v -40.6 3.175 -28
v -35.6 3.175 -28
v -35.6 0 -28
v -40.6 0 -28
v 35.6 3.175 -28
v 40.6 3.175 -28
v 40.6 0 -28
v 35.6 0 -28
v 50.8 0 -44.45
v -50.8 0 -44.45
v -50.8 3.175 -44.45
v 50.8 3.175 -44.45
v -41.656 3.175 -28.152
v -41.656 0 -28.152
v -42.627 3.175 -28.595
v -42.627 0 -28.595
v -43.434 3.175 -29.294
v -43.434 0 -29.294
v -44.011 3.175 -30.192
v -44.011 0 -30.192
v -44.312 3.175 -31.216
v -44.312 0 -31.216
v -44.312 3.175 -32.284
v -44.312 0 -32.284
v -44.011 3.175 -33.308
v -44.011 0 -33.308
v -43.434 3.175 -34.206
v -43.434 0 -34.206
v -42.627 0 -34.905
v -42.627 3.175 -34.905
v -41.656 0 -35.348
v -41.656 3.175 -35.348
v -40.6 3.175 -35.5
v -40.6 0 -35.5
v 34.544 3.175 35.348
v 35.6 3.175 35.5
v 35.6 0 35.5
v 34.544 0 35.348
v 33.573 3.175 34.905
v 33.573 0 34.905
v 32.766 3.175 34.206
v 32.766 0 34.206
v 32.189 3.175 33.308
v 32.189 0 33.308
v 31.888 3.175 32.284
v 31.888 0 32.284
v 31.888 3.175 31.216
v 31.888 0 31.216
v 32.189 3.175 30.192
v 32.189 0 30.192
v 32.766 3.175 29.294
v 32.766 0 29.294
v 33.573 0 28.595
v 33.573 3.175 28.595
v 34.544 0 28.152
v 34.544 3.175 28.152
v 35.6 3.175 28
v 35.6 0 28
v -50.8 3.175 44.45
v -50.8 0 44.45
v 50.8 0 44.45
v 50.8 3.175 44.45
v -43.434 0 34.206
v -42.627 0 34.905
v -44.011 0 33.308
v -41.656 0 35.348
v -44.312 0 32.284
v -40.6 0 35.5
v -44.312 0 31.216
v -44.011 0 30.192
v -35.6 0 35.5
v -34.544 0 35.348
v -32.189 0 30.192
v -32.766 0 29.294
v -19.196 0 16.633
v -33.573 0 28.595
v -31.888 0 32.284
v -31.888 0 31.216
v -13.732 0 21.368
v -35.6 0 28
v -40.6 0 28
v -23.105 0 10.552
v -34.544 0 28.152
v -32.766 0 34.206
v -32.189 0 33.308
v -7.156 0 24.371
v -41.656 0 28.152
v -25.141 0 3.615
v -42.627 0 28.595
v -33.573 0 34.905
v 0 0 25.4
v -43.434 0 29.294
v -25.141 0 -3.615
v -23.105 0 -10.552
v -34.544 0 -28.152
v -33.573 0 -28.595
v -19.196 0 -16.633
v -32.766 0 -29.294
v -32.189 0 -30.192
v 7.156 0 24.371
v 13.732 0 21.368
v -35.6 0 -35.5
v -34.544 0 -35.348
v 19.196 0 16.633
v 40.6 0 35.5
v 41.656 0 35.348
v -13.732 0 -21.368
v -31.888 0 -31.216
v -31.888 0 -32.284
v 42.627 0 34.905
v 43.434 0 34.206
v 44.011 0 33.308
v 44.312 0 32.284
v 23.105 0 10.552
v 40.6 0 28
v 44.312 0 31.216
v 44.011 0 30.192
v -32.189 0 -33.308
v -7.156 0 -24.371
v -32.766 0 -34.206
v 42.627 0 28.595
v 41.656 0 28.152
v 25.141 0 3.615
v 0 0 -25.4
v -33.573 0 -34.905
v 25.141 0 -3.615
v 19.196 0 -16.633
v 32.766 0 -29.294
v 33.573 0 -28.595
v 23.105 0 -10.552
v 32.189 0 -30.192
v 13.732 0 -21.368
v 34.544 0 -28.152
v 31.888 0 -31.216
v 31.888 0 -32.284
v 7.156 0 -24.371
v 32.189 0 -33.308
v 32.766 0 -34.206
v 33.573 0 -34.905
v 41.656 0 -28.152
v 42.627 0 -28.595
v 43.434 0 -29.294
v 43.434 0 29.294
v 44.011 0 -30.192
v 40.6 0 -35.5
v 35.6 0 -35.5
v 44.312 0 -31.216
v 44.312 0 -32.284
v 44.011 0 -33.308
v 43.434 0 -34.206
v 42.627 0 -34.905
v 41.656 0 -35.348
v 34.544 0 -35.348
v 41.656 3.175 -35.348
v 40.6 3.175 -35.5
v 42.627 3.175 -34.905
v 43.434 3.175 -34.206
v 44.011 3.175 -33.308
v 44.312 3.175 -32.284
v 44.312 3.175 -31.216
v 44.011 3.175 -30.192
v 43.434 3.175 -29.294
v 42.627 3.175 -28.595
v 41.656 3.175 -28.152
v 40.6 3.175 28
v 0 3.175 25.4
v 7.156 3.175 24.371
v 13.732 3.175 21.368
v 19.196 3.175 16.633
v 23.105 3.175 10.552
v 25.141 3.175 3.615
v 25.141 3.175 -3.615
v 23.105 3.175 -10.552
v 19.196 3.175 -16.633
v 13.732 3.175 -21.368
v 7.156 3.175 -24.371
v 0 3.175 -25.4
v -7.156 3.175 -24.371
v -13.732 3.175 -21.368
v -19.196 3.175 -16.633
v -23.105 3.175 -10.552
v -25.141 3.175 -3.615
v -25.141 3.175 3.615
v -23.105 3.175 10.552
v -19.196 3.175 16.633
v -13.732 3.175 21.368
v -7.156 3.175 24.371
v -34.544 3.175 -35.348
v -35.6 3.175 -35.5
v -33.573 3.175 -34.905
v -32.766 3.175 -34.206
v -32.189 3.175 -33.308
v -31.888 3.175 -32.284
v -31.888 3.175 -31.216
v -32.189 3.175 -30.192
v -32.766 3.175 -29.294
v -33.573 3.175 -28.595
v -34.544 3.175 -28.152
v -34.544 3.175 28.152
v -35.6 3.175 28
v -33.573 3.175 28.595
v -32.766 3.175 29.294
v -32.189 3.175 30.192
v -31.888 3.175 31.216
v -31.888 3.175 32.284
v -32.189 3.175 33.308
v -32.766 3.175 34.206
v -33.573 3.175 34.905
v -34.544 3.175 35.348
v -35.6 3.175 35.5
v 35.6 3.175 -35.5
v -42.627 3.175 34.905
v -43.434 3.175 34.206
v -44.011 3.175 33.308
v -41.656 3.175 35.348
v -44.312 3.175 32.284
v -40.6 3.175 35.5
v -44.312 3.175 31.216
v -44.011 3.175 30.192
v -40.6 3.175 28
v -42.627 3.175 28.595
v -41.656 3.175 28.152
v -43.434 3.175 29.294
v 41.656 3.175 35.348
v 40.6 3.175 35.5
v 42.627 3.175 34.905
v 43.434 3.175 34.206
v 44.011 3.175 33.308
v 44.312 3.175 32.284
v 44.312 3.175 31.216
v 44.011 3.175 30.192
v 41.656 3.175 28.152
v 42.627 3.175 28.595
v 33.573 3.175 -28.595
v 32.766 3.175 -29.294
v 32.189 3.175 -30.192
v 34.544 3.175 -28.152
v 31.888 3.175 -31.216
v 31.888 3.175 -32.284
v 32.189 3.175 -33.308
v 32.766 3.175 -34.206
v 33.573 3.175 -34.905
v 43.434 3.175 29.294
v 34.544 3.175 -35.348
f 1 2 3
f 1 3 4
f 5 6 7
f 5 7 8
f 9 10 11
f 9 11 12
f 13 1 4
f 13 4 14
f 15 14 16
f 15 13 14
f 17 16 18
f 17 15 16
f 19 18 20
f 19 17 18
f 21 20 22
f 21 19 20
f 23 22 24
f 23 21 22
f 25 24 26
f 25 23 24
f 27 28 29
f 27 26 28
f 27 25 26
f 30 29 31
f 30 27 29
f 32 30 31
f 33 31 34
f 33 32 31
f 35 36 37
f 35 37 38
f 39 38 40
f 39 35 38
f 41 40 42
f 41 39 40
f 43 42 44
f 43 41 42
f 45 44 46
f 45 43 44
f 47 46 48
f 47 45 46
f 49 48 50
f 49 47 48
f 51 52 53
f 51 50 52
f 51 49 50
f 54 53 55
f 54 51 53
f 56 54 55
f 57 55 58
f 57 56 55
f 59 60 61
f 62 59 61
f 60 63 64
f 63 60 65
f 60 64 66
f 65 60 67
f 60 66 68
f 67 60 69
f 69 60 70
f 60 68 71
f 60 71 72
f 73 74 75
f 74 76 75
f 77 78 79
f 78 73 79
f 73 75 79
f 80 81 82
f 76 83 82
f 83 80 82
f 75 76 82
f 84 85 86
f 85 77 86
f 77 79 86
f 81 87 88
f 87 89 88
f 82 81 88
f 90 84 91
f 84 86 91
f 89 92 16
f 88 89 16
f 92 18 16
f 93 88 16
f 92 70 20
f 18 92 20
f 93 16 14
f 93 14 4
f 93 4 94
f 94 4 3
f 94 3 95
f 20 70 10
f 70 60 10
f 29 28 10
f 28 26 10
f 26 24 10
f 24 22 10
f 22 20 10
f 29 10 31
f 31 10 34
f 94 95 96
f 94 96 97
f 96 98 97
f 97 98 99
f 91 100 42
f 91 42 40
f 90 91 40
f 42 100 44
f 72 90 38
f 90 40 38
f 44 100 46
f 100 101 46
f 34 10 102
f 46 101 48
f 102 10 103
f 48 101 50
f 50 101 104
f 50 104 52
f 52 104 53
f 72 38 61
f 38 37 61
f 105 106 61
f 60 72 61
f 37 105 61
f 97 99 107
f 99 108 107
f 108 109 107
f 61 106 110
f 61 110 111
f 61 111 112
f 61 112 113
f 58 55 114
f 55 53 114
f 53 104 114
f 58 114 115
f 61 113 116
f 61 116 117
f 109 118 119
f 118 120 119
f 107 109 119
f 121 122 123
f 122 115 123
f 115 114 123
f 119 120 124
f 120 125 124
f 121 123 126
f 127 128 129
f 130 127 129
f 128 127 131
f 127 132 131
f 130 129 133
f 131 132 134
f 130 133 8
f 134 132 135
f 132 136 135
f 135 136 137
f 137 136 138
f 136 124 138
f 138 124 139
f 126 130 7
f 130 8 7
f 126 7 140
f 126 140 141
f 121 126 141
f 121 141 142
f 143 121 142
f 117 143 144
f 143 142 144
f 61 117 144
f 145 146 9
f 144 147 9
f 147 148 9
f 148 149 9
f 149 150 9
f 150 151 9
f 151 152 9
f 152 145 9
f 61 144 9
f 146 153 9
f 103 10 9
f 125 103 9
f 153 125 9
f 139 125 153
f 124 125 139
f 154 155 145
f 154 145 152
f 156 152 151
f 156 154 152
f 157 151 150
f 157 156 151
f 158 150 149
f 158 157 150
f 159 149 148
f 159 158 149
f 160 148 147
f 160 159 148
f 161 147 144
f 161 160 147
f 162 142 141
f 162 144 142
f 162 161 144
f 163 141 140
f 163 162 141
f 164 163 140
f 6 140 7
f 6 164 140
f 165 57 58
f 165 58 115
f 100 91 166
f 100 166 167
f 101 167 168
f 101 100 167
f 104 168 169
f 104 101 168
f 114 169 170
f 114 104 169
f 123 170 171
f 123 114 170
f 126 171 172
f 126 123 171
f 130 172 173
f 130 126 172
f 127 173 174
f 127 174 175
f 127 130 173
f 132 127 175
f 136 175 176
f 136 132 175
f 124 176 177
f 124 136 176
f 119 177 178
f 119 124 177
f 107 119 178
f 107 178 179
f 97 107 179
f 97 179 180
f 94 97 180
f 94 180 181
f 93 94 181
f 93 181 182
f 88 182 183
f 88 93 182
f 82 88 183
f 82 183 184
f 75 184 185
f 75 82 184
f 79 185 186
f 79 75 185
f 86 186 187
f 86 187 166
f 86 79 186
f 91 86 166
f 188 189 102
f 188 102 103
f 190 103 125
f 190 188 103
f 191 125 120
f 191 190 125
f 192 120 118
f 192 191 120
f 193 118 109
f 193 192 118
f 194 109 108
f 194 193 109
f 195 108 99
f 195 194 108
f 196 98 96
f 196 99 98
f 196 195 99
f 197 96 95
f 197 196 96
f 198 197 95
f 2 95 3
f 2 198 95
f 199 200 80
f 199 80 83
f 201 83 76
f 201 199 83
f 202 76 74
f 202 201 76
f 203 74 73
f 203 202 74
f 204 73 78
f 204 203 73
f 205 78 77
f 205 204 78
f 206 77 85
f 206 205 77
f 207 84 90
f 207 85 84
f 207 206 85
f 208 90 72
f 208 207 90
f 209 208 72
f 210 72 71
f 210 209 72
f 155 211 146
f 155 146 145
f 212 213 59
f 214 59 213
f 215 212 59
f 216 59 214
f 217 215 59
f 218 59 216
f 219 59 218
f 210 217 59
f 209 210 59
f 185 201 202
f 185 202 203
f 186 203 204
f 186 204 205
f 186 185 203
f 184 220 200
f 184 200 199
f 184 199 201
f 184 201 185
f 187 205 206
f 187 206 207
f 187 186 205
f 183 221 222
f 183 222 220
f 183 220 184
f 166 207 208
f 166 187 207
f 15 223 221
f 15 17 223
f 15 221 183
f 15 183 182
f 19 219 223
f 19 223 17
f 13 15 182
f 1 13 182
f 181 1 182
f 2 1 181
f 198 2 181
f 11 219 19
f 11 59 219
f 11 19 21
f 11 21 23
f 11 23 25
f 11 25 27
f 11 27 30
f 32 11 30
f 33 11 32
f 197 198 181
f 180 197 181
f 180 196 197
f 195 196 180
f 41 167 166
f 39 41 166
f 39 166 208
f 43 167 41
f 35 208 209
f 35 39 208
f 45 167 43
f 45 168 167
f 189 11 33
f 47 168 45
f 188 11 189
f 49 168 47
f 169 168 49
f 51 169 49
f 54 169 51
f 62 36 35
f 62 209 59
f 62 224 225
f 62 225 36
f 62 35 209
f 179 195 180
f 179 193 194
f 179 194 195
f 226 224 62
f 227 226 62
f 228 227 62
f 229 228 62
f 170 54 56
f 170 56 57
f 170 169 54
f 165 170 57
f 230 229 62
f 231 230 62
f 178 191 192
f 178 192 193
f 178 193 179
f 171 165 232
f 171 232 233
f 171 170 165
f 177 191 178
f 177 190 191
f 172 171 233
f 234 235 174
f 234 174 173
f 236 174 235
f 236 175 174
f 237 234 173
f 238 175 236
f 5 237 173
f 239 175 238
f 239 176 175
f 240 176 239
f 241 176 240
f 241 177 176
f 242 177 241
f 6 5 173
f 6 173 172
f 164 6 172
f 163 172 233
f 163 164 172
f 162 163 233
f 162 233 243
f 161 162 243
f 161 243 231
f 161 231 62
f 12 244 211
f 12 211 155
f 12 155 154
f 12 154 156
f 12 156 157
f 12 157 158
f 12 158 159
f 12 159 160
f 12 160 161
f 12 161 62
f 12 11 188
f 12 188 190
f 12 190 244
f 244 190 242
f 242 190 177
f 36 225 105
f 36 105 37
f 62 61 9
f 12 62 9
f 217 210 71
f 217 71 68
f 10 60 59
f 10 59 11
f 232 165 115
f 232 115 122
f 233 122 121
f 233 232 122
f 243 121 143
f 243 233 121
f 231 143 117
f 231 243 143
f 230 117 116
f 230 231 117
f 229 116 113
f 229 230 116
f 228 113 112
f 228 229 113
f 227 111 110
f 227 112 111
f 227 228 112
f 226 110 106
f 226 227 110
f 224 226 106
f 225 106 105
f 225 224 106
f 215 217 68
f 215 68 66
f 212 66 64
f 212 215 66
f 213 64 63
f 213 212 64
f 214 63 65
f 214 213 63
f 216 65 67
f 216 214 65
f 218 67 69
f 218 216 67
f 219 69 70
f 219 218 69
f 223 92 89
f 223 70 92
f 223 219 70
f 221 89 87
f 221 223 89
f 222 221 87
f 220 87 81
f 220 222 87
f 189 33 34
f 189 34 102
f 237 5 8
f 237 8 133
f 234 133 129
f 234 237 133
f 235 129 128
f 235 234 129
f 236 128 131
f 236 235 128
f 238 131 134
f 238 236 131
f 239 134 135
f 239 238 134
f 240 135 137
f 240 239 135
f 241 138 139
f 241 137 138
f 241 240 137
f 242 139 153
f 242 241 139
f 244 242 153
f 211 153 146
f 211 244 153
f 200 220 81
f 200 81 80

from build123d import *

# Parameters (mm, degrees)
SKETCH1_W           = 101.6
SKETCH1_H           = 88.9
SKETCH1_R           = 25.4
BOSS_EXTRUDE1_DEPTH = 3.175
CUT_EXTRUDE1_DEPTH  = 68.576054376


with BuildPart() as part:
    # Sketch1 → Boss-Extrude1 (new body)
    with BuildSketch(Plane(origin=(0, 0, 0), x_dir=(1, 0, 0), z_dir=(0, 1, 0))):
        Rectangle(SKETCH1_W, SKETCH1_H)
        with Locations(Location((0, 0, 0), (0, 0, 270))):
            Circle(SKETCH1_R, mode=Mode.SUBTRACT)
    extrude(amount=BOSS_EXTRUDE1_DEPTH)

    # Sketch2 → Cut-Extrude1 (cut, through all)
    with BuildSketch(Plane(origin=(0, 3.175, 0), x_dir=(1, 0, 0), z_dir=(0, 1, 0))):
        with BuildLine():
            Line((-40.6, 35.5), (-35.6, 35.5))
            ThreePointArc((-35.6, 35.5), (-31.85, 31.75), (-35.6, 28))
            Line((-35.6, 28), (-40.6, 28))
            ThreePointArc((-40.6, 28), (-44.35, 31.75), (-40.6, 35.5))
        make_face()
        with BuildLine():
            Line((-40.6, -28), (-35.6, -28))
            ThreePointArc((-35.6, -28), (-31.85, -31.75), (-35.6, -35.5))
            Line((-35.6, -35.5), (-40.6, -35.5))
            ThreePointArc((-40.6, -35.5), (-44.35, -31.75), (-40.6, -28))
        make_face()
        with BuildLine():
            Line((35.6, 35.5), (40.6, 35.5))
            ThreePointArc((40.6, 35.5), (44.35, 31.75), (40.6, 28))
            Line((40.6, 28), (35.6, 28))
            ThreePointArc((35.6, 28), (31.85, 31.75), (35.6, 35.5))
        make_face()
        with BuildLine():
            Line((35.6, -28), (40.6, -28))
            ThreePointArc((40.6, -28), (44.35, -31.75), (40.6, -35.5))
            Line((40.6, -35.5), (35.6, -35.5))
            ThreePointArc((35.6, -35.5), (31.85, -31.75), (35.6, -28))
        make_face()
    extrude(amount=-CUT_EXTRUDE1_DEPTH, mode=Mode.SUBTRACT)


solid = part.part
